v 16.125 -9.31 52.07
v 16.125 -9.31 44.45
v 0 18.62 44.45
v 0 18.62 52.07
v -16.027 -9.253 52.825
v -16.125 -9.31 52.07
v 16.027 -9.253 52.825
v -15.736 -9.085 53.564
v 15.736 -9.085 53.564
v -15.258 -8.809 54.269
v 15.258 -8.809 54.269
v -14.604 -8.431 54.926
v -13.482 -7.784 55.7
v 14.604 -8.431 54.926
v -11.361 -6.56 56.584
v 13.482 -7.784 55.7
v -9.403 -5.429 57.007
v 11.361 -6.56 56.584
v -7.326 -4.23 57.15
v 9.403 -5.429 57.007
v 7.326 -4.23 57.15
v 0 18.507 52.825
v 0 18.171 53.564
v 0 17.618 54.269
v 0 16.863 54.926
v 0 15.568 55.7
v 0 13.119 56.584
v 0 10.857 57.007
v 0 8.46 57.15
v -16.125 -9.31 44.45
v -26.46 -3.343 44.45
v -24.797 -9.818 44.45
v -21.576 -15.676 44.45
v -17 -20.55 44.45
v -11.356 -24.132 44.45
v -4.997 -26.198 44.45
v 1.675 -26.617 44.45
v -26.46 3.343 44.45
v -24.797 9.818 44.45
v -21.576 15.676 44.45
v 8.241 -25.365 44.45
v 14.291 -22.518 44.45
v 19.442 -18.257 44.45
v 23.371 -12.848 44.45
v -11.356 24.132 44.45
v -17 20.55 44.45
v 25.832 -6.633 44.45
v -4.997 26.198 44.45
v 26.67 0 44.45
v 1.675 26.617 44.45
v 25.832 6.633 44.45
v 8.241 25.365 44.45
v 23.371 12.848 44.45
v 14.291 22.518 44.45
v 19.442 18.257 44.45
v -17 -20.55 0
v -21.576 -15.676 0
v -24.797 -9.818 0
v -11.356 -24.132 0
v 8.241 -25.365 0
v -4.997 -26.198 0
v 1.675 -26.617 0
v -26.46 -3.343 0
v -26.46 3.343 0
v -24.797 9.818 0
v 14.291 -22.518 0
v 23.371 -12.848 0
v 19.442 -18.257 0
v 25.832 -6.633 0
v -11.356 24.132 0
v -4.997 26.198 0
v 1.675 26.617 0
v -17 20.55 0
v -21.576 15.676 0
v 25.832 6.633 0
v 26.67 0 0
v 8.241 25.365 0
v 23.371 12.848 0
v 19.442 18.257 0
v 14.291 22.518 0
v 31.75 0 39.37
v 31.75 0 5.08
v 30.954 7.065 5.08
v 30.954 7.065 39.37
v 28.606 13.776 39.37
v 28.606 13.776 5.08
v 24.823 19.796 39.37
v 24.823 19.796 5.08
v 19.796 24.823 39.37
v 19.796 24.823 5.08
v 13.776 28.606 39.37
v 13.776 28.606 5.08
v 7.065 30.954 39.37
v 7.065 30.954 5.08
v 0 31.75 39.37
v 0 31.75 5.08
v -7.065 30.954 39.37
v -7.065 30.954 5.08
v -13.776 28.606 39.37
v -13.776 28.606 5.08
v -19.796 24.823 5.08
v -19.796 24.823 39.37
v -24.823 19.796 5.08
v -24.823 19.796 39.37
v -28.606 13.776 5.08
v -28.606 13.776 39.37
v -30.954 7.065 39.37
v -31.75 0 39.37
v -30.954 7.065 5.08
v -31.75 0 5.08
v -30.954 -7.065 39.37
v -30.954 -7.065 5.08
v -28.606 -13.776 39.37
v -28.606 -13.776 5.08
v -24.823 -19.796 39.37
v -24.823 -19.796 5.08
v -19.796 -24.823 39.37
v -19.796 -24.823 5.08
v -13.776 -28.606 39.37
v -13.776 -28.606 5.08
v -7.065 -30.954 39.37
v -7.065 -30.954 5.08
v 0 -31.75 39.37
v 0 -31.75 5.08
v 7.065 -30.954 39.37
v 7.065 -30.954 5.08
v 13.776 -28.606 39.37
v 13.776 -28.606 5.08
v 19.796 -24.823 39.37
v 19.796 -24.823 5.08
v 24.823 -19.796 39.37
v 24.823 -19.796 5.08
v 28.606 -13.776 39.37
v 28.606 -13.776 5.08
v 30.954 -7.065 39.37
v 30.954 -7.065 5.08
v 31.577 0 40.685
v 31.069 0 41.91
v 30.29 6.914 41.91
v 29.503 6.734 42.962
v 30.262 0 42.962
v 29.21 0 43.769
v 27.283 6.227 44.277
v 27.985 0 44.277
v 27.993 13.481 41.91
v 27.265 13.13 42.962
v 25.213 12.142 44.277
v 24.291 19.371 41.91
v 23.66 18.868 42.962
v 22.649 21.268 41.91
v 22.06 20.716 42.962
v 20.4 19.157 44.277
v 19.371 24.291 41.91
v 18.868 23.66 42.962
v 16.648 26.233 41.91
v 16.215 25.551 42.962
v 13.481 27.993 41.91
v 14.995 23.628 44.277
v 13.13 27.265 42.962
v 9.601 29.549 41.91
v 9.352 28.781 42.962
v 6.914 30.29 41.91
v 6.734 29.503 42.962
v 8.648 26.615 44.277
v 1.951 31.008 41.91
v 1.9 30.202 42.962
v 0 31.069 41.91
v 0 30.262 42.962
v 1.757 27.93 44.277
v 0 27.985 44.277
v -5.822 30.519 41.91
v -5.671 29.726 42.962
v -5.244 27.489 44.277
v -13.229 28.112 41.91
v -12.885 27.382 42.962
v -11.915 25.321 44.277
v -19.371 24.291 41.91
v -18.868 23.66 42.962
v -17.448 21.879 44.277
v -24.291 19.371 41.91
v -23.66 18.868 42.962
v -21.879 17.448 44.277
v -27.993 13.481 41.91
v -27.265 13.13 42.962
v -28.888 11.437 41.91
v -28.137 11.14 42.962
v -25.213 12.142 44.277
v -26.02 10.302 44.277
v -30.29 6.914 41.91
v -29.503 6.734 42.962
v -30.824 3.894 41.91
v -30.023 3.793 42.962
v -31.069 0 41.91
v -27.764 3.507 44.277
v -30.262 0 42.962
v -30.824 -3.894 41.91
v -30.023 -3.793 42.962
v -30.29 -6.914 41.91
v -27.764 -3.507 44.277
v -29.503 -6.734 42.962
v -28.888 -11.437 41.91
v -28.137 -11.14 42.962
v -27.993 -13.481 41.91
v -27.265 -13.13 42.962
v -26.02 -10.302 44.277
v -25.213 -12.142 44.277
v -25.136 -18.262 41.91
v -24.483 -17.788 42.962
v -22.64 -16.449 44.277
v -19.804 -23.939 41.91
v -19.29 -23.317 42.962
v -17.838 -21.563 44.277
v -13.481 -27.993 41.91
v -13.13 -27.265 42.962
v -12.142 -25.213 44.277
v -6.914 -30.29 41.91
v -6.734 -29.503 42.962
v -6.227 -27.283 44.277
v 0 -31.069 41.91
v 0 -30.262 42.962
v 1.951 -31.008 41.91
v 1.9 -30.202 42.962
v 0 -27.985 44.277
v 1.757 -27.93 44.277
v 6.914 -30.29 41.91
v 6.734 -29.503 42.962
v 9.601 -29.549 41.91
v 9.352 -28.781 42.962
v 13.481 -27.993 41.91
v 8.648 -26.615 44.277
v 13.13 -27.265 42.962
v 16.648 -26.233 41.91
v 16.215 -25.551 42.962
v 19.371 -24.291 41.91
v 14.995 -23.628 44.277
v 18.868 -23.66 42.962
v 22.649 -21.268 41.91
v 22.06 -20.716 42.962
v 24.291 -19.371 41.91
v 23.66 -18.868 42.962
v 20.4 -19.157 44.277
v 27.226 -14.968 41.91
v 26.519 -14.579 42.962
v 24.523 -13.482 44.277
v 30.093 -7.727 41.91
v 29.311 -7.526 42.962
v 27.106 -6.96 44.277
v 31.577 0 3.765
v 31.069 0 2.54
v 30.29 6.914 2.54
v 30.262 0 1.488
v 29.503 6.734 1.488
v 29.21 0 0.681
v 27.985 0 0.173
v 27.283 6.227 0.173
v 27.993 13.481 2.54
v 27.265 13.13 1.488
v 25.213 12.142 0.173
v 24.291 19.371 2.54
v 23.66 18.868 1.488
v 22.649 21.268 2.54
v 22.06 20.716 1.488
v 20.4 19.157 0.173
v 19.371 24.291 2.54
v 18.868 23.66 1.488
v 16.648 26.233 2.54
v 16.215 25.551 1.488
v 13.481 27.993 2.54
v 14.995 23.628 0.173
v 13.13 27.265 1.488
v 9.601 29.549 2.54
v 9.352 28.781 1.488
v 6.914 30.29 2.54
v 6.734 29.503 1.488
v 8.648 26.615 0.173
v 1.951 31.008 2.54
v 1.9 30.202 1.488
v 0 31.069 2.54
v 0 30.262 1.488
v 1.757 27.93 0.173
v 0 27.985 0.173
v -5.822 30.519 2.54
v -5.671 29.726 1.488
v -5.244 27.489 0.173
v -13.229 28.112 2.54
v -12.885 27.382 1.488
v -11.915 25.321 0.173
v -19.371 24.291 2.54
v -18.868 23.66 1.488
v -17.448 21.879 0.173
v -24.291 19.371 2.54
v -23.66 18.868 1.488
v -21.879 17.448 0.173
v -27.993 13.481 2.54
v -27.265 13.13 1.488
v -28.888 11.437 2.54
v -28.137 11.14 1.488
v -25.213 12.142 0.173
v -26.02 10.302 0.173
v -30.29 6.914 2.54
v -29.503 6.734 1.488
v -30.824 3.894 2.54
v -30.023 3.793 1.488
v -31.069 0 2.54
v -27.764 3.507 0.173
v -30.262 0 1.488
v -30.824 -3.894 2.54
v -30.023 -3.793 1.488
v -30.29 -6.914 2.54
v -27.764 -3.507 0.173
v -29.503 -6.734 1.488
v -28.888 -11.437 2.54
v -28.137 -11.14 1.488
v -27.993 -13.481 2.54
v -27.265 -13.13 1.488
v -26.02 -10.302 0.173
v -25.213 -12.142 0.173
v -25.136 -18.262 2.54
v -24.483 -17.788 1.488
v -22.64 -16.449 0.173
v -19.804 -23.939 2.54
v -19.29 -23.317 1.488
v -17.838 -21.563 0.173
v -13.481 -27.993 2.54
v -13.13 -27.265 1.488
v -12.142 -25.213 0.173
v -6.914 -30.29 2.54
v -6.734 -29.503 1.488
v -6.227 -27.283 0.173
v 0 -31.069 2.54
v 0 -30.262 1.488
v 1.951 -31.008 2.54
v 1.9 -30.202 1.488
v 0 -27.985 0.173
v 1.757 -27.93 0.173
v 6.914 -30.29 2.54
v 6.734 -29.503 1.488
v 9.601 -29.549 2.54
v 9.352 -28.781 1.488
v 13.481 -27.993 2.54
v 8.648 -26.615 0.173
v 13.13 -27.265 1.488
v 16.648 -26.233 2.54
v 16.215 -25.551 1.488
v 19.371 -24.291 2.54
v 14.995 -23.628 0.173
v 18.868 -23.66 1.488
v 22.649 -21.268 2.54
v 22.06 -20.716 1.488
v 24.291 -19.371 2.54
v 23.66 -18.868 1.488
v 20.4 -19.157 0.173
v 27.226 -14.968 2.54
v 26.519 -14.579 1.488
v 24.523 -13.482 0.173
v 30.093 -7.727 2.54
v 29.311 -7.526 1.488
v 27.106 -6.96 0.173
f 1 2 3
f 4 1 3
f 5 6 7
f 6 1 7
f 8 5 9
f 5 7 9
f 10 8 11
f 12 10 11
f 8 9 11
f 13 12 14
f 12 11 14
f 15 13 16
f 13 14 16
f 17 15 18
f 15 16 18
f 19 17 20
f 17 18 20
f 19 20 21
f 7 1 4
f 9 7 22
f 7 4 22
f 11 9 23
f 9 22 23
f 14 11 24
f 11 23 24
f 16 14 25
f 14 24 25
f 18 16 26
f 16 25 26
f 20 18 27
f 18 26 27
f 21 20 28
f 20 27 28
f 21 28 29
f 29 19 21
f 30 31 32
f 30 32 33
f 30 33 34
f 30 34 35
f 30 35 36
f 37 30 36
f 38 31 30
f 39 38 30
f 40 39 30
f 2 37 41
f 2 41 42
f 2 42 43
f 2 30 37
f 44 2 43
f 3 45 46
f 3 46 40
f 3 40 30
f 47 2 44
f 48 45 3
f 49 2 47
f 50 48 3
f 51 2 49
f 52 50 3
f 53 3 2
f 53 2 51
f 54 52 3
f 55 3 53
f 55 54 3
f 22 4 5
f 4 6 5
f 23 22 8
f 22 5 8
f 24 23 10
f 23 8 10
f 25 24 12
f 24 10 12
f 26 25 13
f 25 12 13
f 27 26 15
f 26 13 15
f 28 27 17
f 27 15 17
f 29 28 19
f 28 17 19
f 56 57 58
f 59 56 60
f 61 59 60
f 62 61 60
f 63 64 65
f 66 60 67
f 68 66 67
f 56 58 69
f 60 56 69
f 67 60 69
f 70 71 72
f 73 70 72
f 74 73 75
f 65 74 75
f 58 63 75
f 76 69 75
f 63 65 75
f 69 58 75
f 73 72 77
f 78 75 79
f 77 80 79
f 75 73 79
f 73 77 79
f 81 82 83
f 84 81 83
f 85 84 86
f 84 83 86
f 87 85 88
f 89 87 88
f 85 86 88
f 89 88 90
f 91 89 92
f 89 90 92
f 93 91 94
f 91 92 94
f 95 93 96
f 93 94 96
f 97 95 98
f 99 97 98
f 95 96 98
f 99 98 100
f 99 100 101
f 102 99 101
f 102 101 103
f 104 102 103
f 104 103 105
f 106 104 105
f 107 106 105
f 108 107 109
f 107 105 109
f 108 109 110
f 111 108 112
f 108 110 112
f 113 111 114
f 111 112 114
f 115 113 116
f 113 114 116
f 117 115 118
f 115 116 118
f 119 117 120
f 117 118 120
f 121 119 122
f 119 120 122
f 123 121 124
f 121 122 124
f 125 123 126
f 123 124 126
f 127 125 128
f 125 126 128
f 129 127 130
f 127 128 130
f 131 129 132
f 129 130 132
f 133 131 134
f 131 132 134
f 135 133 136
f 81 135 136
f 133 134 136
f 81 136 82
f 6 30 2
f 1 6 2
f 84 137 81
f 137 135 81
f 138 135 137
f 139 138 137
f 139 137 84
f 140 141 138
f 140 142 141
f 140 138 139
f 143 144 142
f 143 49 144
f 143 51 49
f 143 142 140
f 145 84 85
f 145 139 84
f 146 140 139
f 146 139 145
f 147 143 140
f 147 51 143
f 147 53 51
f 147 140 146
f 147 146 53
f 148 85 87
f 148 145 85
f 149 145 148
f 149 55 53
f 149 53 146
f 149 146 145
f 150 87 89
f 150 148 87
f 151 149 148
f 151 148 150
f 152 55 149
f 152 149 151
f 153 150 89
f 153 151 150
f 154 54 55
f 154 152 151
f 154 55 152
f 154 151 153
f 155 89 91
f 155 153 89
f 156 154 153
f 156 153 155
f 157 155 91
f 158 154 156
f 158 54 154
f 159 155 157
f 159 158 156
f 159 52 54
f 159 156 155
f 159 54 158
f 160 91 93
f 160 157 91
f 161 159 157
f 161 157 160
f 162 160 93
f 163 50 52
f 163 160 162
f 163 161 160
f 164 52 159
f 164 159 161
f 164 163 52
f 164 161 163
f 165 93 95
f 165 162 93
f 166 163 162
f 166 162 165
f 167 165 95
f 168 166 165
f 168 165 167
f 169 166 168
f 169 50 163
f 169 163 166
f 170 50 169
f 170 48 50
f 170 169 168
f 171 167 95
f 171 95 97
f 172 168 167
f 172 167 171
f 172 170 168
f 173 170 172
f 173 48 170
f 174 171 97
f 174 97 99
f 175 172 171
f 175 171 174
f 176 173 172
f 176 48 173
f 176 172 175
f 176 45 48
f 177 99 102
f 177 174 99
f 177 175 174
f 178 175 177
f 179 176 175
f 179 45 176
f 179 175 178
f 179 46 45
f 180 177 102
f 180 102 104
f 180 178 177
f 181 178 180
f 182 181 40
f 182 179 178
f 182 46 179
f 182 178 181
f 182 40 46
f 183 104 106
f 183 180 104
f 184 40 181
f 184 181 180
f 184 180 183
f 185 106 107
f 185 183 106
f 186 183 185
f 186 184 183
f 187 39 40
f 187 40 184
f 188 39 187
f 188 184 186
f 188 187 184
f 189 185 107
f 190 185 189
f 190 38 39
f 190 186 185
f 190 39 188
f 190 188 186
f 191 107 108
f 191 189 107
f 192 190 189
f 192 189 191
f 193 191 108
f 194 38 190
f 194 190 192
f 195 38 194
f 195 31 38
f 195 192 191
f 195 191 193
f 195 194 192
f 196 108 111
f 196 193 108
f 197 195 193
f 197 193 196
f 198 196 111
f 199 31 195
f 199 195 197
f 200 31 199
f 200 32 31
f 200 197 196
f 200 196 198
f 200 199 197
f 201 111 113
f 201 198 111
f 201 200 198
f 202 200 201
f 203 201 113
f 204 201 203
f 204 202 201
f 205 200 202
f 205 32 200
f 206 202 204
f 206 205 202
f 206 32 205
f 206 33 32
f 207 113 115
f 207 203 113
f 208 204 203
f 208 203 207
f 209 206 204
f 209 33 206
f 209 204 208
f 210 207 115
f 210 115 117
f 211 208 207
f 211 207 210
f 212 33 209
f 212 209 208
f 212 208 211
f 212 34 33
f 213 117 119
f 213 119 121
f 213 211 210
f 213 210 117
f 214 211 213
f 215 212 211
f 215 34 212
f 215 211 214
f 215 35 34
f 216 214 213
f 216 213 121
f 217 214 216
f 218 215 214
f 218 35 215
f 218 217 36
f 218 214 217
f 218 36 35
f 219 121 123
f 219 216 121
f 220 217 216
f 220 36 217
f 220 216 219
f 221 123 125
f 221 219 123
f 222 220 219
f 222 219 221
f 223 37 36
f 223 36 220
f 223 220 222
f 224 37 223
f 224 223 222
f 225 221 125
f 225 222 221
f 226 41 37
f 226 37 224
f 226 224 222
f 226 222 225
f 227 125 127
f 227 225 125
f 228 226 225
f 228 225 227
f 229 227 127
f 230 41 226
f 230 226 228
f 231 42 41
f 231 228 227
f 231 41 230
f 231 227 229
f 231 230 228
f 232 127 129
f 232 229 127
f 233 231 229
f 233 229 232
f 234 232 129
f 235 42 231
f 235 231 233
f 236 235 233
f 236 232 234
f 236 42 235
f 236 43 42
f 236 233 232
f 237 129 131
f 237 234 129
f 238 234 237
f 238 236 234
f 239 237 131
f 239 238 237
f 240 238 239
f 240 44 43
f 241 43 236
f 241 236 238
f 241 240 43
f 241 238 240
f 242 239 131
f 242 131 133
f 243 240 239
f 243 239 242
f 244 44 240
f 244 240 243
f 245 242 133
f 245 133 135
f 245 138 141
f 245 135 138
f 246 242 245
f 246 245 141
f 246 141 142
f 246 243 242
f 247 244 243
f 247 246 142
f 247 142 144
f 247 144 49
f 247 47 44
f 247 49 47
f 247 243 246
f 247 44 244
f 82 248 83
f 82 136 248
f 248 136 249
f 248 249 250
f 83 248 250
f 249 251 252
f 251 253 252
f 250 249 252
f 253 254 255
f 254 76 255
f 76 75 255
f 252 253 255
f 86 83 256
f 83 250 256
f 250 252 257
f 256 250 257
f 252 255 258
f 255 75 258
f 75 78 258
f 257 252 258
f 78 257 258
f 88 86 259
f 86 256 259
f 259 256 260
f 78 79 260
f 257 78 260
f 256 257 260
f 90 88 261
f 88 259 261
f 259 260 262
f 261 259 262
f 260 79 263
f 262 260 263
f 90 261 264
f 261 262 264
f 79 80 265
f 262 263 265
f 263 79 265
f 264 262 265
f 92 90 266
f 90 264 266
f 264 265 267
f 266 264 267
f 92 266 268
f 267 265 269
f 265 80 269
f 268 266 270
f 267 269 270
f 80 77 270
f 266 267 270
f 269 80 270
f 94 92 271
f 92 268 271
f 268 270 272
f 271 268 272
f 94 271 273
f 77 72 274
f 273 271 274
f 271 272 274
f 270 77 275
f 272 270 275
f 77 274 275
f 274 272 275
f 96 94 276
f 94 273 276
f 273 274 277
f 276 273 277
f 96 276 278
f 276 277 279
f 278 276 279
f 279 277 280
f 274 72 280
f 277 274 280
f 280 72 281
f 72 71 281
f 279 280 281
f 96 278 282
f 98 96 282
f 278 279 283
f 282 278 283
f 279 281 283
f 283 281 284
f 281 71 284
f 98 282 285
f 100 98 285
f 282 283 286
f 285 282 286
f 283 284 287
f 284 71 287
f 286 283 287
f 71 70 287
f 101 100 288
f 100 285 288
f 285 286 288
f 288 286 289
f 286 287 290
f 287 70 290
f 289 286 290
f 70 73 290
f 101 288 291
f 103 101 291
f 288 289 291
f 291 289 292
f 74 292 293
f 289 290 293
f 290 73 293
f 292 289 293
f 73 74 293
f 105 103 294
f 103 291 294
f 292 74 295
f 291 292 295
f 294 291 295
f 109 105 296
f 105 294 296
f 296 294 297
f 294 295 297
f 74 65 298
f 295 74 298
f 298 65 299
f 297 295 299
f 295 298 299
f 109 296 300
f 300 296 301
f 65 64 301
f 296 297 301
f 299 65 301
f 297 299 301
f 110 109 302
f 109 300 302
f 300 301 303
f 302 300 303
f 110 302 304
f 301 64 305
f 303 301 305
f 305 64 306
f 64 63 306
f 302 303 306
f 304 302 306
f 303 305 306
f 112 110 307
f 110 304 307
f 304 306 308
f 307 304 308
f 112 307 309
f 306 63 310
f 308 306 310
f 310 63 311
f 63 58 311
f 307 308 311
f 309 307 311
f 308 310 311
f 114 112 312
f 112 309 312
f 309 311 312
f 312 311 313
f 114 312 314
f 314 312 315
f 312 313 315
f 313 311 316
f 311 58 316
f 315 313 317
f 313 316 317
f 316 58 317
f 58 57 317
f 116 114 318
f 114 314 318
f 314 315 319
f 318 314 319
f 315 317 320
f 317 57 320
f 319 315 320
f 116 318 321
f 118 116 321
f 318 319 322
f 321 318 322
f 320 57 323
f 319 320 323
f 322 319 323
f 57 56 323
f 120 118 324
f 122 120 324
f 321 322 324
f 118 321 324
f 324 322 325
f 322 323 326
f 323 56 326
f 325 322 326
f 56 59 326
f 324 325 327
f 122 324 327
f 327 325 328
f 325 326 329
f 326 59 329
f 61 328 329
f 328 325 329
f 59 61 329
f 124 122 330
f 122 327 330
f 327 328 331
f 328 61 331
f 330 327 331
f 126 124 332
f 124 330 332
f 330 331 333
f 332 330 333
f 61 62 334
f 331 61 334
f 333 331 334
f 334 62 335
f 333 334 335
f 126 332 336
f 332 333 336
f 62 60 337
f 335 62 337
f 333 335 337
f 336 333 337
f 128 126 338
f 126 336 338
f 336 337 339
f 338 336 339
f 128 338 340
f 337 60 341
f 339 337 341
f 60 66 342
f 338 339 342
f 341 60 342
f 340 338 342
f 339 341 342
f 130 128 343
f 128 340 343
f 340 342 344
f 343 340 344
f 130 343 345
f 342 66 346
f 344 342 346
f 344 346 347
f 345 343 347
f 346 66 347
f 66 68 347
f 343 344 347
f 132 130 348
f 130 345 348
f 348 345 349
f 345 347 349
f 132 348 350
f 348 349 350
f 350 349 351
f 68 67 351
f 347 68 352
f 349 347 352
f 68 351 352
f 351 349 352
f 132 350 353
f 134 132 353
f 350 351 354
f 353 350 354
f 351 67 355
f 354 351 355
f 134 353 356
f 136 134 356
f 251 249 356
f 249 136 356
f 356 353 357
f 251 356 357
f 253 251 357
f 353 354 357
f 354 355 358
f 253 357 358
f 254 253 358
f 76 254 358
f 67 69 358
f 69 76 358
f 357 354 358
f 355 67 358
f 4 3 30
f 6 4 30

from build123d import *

# Parameters (mm, degrees)
F0_R     = 31.75
F1_DEPTH = 44.45
F3_DEPTH = 12.7
F4_R     = 5.08


with BuildPart() as f1:
    # F0 (on Top) → F1 (new body)
    with BuildSketch(Plane.XY):
        Circle(F0_R)
    extrude(amount=F1_DEPTH)

    # F2 (on face) → F3 (join)
    with BuildSketch(Plane.XY.offset(44.45)):
        Polygon((-16.125254, -9.30992), (16.125254, -9.30992), (0, 18.619839), align=None)
    extrude(amount=F3_DEPTH)

    # F4
    f4_edges = [f1.edges().sort_by_distance(p)[0] for p in [
        (-31.75, 0, 0),
        (-31.75, 0, 44.45),
        (0, -9.30992, 57.15),
        (-8.062627, 4.65496, 57.15),
        (8.062627, 4.65496, 57.15),
    ]]
    fillet(f4_edges, radius=F4_R)


solid = f1.part
